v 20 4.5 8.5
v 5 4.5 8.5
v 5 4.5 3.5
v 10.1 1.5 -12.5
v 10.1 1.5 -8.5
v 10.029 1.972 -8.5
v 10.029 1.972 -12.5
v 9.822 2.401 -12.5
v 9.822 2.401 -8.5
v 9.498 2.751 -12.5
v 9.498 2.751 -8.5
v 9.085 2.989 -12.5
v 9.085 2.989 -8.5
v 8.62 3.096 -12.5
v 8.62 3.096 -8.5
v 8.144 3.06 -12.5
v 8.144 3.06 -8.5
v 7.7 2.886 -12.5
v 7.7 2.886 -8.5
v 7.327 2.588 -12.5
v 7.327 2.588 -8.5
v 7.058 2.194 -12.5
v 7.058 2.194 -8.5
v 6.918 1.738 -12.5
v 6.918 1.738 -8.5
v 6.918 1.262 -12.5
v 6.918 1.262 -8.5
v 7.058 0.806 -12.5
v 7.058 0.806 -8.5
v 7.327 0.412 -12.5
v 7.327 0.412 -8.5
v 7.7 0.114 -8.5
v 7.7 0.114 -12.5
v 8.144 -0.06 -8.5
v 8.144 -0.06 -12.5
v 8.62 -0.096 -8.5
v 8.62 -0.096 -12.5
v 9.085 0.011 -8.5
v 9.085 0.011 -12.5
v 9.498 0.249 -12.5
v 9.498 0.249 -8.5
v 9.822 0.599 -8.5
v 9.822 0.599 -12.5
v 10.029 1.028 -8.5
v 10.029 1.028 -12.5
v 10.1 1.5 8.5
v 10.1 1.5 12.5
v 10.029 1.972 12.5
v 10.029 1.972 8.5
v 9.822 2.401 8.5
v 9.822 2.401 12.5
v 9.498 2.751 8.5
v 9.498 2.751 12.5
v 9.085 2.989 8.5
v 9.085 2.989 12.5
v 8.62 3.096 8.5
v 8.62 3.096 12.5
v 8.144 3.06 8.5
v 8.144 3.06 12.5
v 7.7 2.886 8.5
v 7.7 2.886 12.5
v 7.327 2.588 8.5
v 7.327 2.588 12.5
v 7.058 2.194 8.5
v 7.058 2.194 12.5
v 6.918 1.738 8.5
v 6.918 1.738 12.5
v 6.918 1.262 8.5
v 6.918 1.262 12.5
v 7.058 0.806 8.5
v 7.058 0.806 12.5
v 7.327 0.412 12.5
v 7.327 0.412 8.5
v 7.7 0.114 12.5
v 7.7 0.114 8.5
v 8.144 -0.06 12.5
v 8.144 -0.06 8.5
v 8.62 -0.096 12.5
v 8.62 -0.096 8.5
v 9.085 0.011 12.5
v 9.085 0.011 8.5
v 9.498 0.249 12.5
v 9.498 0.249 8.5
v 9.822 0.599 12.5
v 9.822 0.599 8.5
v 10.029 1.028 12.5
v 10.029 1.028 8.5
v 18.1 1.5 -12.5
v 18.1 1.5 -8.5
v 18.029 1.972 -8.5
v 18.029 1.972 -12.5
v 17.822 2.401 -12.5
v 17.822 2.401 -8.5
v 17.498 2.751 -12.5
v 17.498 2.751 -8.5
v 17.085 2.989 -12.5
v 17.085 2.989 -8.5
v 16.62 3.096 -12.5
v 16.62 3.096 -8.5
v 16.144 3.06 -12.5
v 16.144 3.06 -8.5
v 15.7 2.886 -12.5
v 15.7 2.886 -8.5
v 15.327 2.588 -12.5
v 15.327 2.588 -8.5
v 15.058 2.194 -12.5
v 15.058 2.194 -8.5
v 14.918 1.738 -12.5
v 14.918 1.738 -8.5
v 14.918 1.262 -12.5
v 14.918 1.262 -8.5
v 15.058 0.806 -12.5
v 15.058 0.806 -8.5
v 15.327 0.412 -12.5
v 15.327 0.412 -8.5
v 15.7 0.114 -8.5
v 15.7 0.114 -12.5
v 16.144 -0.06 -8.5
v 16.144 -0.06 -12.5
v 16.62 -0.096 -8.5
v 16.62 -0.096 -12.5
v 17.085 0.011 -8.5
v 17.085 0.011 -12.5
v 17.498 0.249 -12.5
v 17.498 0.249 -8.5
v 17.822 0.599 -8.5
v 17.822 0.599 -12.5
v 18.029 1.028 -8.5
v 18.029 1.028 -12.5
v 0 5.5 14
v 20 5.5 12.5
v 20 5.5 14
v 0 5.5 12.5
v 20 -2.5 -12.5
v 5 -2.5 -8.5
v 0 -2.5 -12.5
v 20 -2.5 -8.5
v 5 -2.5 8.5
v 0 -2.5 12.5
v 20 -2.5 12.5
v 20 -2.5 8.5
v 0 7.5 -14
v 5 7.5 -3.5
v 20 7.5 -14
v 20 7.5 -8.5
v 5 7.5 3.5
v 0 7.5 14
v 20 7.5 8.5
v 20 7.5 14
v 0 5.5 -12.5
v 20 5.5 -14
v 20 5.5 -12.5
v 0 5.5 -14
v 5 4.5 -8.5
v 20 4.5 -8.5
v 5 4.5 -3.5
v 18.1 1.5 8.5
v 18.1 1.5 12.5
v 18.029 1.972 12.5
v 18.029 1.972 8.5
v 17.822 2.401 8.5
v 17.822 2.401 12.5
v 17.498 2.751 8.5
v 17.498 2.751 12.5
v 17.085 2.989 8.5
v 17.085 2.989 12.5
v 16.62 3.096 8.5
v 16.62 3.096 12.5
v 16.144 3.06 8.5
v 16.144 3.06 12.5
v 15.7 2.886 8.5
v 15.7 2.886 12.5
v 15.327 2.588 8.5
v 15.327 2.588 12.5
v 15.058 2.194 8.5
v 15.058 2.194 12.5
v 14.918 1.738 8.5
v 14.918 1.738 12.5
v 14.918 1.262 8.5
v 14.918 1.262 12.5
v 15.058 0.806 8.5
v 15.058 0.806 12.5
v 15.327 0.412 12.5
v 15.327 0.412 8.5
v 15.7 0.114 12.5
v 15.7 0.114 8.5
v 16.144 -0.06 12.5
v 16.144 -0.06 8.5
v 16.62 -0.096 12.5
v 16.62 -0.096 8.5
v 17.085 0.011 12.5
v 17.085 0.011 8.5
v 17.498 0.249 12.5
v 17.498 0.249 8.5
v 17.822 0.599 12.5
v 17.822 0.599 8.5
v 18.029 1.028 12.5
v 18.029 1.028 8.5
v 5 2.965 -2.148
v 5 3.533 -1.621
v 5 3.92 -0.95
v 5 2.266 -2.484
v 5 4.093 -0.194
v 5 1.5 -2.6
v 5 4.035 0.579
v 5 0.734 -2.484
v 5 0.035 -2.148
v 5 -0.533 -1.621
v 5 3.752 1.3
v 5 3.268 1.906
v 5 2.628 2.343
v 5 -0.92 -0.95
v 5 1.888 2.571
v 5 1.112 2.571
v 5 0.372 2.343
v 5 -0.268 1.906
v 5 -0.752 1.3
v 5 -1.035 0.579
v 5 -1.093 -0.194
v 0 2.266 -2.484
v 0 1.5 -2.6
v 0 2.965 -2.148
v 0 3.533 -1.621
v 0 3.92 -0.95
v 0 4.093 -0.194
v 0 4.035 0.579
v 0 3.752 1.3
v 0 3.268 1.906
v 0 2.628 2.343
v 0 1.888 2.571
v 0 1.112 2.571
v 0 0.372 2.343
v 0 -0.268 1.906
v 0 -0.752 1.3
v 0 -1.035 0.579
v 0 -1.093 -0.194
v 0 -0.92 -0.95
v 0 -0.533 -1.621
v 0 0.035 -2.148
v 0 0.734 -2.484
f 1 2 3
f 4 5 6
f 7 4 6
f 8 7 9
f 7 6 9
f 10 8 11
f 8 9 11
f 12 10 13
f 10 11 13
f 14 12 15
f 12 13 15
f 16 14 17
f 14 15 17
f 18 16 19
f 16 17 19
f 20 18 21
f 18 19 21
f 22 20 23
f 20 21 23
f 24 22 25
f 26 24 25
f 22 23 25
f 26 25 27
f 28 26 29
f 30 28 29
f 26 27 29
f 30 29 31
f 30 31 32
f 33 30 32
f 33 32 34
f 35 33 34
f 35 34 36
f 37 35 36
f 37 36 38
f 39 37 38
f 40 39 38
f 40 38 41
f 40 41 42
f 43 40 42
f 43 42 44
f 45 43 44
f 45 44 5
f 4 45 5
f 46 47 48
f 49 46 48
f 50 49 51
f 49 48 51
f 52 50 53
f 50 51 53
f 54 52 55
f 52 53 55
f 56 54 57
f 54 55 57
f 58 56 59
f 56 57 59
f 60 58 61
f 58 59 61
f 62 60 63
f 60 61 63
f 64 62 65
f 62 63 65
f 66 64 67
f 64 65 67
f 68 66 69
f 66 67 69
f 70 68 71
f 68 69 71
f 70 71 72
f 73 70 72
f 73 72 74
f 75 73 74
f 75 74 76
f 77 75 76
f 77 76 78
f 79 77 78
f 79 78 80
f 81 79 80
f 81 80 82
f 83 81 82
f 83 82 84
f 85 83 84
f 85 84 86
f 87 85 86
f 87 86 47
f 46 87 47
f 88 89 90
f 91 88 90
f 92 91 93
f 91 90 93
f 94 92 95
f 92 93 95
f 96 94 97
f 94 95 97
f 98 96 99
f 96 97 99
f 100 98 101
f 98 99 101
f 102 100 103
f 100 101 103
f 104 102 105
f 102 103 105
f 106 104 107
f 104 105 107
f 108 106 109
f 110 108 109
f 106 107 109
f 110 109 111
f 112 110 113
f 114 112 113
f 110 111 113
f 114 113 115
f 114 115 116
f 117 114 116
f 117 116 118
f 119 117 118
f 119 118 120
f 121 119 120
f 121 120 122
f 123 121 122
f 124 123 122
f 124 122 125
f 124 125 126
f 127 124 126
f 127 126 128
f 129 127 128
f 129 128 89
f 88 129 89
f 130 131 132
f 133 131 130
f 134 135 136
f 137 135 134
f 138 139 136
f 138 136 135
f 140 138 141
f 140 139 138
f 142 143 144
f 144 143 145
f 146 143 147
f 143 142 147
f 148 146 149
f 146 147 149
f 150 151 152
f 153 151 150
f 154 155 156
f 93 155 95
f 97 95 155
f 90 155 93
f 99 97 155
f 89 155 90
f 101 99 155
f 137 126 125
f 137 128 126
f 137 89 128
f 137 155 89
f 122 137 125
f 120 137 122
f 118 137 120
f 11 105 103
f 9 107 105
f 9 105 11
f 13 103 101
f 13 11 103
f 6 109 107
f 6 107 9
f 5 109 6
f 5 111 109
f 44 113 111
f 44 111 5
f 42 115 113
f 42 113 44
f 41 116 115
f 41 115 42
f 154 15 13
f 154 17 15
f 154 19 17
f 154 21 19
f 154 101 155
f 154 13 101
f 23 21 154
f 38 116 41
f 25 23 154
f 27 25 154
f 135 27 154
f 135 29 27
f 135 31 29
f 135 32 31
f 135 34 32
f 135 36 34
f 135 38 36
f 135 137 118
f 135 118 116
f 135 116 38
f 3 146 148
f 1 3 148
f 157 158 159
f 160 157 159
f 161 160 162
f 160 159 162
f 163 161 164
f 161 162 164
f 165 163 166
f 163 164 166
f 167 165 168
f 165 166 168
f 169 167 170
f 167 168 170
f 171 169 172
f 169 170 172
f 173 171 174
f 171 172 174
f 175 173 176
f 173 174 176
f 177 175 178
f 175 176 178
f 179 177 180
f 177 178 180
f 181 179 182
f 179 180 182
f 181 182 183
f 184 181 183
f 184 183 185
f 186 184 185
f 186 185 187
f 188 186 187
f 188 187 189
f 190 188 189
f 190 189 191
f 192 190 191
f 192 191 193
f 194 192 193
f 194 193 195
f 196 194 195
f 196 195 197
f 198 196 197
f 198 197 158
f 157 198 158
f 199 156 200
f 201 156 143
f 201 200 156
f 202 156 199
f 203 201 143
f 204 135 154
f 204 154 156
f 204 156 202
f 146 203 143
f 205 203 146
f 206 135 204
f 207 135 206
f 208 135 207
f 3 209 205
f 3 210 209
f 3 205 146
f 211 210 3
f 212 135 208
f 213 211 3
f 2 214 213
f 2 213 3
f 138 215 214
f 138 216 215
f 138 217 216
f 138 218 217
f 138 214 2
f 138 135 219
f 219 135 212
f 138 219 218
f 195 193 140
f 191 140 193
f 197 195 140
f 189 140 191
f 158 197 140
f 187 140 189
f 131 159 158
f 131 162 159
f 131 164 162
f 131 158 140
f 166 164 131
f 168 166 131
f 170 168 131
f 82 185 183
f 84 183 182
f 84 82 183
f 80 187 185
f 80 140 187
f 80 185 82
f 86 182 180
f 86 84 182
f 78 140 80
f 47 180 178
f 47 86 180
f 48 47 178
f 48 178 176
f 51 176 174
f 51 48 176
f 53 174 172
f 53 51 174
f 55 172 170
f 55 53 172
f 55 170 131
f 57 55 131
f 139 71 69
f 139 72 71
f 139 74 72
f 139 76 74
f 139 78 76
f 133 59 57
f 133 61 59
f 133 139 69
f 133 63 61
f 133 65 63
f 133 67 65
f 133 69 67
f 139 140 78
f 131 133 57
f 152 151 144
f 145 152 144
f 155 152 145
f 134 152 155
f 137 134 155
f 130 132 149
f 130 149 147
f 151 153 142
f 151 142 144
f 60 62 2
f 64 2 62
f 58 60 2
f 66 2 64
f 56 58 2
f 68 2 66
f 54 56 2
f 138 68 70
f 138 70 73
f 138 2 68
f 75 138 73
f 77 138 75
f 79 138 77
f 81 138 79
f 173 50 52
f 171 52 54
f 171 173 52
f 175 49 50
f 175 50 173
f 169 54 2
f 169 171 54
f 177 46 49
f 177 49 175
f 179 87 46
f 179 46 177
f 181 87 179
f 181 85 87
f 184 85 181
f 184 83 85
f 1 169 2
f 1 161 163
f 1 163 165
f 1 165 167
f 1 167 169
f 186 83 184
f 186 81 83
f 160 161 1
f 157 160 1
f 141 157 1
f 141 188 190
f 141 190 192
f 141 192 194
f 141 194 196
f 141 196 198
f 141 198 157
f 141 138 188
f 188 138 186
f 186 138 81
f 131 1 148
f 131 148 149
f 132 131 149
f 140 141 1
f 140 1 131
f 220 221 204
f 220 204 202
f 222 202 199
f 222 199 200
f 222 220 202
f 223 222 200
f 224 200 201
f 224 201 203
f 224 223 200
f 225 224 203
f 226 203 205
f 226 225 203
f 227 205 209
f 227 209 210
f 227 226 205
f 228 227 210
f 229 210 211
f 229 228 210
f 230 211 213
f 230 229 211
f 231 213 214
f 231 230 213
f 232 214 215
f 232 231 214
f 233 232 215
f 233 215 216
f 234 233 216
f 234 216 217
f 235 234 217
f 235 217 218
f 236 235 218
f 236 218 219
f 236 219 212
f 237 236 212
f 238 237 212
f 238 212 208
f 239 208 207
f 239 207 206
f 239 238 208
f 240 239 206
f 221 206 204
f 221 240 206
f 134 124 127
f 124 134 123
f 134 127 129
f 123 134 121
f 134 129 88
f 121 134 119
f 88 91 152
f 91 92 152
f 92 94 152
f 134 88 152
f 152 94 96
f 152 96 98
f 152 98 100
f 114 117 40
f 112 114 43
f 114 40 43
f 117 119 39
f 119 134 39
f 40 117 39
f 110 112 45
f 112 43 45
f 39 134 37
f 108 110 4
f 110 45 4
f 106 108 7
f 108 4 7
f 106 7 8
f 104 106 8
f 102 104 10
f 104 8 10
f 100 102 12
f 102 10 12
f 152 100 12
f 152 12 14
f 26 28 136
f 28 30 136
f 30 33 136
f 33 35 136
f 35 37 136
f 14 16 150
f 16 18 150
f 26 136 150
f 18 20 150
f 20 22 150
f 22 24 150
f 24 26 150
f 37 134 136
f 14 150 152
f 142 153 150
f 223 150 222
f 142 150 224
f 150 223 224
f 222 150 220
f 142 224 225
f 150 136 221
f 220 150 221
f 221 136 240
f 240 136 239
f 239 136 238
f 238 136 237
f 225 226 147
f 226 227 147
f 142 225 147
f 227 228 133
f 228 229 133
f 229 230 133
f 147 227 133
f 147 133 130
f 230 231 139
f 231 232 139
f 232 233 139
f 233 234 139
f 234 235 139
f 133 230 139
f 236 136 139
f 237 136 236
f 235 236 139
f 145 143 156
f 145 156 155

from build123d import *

# Parameters (mm, degrees)
SKETCH_1_W          = 25
SKETCH_1_H          = 11
SKETCH_1_R          = 2.6
EXTRUDE_1_DEPTH     = 5
SKETCH_2_W          = 4
SKETCH_2_H          = 11
EXTRUDE_2_DEPTH     = 15
SKETCH_4_R          = 1.6
CUT_EXTRUDE_1_DEPTH = 33.484611742
EXTRUDE_4_DEPTH     = 2
EXTRUDE_3_DEPTH     = 3
SKETCH_8_W          = 20
SKETCH_8_H          = 25
CUT_EXTRUDE_2_DEPTH = 3


with BuildPart() as part:
    # 草图1 → 凸台-拉伸1 (new body)
    with BuildSketch(Plane(origin=(0, 0, 0), x_dir=(0, 0, -1), z_dir=(1, 0, 0))):
        Rectangle(SKETCH_1_W, SKETCH_1_H)
        with Locations((0, 1.5)):
            Circle(SKETCH_1_R, mode=Mode.SUBTRACT)
    extrude(amount=EXTRUDE_1_DEPTH)

    # 草图2 → 凸台-拉伸2 (add)
    with BuildSketch(Plane(origin=(5, 0, 0), x_dir=(0, 0, -1), z_dir=(1, 0, 0))):
        with Locations((-10.5, 0)):
            Rectangle(SKETCH_2_W, SKETCH_2_H)
        with Locations((10.5, 0)):
            Rectangle(SKETCH_2_W, SKETCH_2_H)
    extrude(amount=EXTRUDE_2_DEPTH)

    # 草图4 → 切除-拉伸1 (cut, through all)
    with BuildSketch(Plane.XY.offset(12.5)):
        with Locations((16.5, 1.5)):
            Circle(SKETCH_4_R)
        with Locations((8.5, 1.5)):
            Circle(SKETCH_4_R)
    extrude(amount=-CUT_EXTRUDE_1_DEPTH, mode=Mode.SUBTRACT)

    # 草图7 → 凸台-拉伸4 (add)
    with BuildSketch(Plane(origin=(0, 5.5, 0), x_dir=(1, 0, 0), z_dir=(0, 1, 0))):
        Polygon((20, 8.5), (5, 8.5), (5, -8.5), (20, -8.5), (20, -14), (0, -14), (0, -8.5), (0, 8.5), (0, 14), (20, 14), align=None)
    extrude(amount=EXTRUDE_4_DEPTH)

    # 草图6 → 凸台-拉伸3 (add)
    with BuildSketch(Plane.XZ.offset(-7.5)):
        Polygon((20, 8.5), (5, 8.5), (5, 3.5), align=None)
        Polygon((5, -8.5), (5, -3.5), (20, -8.5), align=None)
    extrude(amount=EXTRUDE_3_DEPTH)

    # 草图8 → 切除-拉伸2 (cut)
    with BuildSketch(Plane.XZ.offset(5.5)):
        with Locations((10, 0)):
            Rectangle(SKETCH_8_W, SKETCH_8_H)
    extrude(amount=-CUT_EXTRUDE_2_DEPTH, mode=Mode.SUBTRACT)


solid = part.part
